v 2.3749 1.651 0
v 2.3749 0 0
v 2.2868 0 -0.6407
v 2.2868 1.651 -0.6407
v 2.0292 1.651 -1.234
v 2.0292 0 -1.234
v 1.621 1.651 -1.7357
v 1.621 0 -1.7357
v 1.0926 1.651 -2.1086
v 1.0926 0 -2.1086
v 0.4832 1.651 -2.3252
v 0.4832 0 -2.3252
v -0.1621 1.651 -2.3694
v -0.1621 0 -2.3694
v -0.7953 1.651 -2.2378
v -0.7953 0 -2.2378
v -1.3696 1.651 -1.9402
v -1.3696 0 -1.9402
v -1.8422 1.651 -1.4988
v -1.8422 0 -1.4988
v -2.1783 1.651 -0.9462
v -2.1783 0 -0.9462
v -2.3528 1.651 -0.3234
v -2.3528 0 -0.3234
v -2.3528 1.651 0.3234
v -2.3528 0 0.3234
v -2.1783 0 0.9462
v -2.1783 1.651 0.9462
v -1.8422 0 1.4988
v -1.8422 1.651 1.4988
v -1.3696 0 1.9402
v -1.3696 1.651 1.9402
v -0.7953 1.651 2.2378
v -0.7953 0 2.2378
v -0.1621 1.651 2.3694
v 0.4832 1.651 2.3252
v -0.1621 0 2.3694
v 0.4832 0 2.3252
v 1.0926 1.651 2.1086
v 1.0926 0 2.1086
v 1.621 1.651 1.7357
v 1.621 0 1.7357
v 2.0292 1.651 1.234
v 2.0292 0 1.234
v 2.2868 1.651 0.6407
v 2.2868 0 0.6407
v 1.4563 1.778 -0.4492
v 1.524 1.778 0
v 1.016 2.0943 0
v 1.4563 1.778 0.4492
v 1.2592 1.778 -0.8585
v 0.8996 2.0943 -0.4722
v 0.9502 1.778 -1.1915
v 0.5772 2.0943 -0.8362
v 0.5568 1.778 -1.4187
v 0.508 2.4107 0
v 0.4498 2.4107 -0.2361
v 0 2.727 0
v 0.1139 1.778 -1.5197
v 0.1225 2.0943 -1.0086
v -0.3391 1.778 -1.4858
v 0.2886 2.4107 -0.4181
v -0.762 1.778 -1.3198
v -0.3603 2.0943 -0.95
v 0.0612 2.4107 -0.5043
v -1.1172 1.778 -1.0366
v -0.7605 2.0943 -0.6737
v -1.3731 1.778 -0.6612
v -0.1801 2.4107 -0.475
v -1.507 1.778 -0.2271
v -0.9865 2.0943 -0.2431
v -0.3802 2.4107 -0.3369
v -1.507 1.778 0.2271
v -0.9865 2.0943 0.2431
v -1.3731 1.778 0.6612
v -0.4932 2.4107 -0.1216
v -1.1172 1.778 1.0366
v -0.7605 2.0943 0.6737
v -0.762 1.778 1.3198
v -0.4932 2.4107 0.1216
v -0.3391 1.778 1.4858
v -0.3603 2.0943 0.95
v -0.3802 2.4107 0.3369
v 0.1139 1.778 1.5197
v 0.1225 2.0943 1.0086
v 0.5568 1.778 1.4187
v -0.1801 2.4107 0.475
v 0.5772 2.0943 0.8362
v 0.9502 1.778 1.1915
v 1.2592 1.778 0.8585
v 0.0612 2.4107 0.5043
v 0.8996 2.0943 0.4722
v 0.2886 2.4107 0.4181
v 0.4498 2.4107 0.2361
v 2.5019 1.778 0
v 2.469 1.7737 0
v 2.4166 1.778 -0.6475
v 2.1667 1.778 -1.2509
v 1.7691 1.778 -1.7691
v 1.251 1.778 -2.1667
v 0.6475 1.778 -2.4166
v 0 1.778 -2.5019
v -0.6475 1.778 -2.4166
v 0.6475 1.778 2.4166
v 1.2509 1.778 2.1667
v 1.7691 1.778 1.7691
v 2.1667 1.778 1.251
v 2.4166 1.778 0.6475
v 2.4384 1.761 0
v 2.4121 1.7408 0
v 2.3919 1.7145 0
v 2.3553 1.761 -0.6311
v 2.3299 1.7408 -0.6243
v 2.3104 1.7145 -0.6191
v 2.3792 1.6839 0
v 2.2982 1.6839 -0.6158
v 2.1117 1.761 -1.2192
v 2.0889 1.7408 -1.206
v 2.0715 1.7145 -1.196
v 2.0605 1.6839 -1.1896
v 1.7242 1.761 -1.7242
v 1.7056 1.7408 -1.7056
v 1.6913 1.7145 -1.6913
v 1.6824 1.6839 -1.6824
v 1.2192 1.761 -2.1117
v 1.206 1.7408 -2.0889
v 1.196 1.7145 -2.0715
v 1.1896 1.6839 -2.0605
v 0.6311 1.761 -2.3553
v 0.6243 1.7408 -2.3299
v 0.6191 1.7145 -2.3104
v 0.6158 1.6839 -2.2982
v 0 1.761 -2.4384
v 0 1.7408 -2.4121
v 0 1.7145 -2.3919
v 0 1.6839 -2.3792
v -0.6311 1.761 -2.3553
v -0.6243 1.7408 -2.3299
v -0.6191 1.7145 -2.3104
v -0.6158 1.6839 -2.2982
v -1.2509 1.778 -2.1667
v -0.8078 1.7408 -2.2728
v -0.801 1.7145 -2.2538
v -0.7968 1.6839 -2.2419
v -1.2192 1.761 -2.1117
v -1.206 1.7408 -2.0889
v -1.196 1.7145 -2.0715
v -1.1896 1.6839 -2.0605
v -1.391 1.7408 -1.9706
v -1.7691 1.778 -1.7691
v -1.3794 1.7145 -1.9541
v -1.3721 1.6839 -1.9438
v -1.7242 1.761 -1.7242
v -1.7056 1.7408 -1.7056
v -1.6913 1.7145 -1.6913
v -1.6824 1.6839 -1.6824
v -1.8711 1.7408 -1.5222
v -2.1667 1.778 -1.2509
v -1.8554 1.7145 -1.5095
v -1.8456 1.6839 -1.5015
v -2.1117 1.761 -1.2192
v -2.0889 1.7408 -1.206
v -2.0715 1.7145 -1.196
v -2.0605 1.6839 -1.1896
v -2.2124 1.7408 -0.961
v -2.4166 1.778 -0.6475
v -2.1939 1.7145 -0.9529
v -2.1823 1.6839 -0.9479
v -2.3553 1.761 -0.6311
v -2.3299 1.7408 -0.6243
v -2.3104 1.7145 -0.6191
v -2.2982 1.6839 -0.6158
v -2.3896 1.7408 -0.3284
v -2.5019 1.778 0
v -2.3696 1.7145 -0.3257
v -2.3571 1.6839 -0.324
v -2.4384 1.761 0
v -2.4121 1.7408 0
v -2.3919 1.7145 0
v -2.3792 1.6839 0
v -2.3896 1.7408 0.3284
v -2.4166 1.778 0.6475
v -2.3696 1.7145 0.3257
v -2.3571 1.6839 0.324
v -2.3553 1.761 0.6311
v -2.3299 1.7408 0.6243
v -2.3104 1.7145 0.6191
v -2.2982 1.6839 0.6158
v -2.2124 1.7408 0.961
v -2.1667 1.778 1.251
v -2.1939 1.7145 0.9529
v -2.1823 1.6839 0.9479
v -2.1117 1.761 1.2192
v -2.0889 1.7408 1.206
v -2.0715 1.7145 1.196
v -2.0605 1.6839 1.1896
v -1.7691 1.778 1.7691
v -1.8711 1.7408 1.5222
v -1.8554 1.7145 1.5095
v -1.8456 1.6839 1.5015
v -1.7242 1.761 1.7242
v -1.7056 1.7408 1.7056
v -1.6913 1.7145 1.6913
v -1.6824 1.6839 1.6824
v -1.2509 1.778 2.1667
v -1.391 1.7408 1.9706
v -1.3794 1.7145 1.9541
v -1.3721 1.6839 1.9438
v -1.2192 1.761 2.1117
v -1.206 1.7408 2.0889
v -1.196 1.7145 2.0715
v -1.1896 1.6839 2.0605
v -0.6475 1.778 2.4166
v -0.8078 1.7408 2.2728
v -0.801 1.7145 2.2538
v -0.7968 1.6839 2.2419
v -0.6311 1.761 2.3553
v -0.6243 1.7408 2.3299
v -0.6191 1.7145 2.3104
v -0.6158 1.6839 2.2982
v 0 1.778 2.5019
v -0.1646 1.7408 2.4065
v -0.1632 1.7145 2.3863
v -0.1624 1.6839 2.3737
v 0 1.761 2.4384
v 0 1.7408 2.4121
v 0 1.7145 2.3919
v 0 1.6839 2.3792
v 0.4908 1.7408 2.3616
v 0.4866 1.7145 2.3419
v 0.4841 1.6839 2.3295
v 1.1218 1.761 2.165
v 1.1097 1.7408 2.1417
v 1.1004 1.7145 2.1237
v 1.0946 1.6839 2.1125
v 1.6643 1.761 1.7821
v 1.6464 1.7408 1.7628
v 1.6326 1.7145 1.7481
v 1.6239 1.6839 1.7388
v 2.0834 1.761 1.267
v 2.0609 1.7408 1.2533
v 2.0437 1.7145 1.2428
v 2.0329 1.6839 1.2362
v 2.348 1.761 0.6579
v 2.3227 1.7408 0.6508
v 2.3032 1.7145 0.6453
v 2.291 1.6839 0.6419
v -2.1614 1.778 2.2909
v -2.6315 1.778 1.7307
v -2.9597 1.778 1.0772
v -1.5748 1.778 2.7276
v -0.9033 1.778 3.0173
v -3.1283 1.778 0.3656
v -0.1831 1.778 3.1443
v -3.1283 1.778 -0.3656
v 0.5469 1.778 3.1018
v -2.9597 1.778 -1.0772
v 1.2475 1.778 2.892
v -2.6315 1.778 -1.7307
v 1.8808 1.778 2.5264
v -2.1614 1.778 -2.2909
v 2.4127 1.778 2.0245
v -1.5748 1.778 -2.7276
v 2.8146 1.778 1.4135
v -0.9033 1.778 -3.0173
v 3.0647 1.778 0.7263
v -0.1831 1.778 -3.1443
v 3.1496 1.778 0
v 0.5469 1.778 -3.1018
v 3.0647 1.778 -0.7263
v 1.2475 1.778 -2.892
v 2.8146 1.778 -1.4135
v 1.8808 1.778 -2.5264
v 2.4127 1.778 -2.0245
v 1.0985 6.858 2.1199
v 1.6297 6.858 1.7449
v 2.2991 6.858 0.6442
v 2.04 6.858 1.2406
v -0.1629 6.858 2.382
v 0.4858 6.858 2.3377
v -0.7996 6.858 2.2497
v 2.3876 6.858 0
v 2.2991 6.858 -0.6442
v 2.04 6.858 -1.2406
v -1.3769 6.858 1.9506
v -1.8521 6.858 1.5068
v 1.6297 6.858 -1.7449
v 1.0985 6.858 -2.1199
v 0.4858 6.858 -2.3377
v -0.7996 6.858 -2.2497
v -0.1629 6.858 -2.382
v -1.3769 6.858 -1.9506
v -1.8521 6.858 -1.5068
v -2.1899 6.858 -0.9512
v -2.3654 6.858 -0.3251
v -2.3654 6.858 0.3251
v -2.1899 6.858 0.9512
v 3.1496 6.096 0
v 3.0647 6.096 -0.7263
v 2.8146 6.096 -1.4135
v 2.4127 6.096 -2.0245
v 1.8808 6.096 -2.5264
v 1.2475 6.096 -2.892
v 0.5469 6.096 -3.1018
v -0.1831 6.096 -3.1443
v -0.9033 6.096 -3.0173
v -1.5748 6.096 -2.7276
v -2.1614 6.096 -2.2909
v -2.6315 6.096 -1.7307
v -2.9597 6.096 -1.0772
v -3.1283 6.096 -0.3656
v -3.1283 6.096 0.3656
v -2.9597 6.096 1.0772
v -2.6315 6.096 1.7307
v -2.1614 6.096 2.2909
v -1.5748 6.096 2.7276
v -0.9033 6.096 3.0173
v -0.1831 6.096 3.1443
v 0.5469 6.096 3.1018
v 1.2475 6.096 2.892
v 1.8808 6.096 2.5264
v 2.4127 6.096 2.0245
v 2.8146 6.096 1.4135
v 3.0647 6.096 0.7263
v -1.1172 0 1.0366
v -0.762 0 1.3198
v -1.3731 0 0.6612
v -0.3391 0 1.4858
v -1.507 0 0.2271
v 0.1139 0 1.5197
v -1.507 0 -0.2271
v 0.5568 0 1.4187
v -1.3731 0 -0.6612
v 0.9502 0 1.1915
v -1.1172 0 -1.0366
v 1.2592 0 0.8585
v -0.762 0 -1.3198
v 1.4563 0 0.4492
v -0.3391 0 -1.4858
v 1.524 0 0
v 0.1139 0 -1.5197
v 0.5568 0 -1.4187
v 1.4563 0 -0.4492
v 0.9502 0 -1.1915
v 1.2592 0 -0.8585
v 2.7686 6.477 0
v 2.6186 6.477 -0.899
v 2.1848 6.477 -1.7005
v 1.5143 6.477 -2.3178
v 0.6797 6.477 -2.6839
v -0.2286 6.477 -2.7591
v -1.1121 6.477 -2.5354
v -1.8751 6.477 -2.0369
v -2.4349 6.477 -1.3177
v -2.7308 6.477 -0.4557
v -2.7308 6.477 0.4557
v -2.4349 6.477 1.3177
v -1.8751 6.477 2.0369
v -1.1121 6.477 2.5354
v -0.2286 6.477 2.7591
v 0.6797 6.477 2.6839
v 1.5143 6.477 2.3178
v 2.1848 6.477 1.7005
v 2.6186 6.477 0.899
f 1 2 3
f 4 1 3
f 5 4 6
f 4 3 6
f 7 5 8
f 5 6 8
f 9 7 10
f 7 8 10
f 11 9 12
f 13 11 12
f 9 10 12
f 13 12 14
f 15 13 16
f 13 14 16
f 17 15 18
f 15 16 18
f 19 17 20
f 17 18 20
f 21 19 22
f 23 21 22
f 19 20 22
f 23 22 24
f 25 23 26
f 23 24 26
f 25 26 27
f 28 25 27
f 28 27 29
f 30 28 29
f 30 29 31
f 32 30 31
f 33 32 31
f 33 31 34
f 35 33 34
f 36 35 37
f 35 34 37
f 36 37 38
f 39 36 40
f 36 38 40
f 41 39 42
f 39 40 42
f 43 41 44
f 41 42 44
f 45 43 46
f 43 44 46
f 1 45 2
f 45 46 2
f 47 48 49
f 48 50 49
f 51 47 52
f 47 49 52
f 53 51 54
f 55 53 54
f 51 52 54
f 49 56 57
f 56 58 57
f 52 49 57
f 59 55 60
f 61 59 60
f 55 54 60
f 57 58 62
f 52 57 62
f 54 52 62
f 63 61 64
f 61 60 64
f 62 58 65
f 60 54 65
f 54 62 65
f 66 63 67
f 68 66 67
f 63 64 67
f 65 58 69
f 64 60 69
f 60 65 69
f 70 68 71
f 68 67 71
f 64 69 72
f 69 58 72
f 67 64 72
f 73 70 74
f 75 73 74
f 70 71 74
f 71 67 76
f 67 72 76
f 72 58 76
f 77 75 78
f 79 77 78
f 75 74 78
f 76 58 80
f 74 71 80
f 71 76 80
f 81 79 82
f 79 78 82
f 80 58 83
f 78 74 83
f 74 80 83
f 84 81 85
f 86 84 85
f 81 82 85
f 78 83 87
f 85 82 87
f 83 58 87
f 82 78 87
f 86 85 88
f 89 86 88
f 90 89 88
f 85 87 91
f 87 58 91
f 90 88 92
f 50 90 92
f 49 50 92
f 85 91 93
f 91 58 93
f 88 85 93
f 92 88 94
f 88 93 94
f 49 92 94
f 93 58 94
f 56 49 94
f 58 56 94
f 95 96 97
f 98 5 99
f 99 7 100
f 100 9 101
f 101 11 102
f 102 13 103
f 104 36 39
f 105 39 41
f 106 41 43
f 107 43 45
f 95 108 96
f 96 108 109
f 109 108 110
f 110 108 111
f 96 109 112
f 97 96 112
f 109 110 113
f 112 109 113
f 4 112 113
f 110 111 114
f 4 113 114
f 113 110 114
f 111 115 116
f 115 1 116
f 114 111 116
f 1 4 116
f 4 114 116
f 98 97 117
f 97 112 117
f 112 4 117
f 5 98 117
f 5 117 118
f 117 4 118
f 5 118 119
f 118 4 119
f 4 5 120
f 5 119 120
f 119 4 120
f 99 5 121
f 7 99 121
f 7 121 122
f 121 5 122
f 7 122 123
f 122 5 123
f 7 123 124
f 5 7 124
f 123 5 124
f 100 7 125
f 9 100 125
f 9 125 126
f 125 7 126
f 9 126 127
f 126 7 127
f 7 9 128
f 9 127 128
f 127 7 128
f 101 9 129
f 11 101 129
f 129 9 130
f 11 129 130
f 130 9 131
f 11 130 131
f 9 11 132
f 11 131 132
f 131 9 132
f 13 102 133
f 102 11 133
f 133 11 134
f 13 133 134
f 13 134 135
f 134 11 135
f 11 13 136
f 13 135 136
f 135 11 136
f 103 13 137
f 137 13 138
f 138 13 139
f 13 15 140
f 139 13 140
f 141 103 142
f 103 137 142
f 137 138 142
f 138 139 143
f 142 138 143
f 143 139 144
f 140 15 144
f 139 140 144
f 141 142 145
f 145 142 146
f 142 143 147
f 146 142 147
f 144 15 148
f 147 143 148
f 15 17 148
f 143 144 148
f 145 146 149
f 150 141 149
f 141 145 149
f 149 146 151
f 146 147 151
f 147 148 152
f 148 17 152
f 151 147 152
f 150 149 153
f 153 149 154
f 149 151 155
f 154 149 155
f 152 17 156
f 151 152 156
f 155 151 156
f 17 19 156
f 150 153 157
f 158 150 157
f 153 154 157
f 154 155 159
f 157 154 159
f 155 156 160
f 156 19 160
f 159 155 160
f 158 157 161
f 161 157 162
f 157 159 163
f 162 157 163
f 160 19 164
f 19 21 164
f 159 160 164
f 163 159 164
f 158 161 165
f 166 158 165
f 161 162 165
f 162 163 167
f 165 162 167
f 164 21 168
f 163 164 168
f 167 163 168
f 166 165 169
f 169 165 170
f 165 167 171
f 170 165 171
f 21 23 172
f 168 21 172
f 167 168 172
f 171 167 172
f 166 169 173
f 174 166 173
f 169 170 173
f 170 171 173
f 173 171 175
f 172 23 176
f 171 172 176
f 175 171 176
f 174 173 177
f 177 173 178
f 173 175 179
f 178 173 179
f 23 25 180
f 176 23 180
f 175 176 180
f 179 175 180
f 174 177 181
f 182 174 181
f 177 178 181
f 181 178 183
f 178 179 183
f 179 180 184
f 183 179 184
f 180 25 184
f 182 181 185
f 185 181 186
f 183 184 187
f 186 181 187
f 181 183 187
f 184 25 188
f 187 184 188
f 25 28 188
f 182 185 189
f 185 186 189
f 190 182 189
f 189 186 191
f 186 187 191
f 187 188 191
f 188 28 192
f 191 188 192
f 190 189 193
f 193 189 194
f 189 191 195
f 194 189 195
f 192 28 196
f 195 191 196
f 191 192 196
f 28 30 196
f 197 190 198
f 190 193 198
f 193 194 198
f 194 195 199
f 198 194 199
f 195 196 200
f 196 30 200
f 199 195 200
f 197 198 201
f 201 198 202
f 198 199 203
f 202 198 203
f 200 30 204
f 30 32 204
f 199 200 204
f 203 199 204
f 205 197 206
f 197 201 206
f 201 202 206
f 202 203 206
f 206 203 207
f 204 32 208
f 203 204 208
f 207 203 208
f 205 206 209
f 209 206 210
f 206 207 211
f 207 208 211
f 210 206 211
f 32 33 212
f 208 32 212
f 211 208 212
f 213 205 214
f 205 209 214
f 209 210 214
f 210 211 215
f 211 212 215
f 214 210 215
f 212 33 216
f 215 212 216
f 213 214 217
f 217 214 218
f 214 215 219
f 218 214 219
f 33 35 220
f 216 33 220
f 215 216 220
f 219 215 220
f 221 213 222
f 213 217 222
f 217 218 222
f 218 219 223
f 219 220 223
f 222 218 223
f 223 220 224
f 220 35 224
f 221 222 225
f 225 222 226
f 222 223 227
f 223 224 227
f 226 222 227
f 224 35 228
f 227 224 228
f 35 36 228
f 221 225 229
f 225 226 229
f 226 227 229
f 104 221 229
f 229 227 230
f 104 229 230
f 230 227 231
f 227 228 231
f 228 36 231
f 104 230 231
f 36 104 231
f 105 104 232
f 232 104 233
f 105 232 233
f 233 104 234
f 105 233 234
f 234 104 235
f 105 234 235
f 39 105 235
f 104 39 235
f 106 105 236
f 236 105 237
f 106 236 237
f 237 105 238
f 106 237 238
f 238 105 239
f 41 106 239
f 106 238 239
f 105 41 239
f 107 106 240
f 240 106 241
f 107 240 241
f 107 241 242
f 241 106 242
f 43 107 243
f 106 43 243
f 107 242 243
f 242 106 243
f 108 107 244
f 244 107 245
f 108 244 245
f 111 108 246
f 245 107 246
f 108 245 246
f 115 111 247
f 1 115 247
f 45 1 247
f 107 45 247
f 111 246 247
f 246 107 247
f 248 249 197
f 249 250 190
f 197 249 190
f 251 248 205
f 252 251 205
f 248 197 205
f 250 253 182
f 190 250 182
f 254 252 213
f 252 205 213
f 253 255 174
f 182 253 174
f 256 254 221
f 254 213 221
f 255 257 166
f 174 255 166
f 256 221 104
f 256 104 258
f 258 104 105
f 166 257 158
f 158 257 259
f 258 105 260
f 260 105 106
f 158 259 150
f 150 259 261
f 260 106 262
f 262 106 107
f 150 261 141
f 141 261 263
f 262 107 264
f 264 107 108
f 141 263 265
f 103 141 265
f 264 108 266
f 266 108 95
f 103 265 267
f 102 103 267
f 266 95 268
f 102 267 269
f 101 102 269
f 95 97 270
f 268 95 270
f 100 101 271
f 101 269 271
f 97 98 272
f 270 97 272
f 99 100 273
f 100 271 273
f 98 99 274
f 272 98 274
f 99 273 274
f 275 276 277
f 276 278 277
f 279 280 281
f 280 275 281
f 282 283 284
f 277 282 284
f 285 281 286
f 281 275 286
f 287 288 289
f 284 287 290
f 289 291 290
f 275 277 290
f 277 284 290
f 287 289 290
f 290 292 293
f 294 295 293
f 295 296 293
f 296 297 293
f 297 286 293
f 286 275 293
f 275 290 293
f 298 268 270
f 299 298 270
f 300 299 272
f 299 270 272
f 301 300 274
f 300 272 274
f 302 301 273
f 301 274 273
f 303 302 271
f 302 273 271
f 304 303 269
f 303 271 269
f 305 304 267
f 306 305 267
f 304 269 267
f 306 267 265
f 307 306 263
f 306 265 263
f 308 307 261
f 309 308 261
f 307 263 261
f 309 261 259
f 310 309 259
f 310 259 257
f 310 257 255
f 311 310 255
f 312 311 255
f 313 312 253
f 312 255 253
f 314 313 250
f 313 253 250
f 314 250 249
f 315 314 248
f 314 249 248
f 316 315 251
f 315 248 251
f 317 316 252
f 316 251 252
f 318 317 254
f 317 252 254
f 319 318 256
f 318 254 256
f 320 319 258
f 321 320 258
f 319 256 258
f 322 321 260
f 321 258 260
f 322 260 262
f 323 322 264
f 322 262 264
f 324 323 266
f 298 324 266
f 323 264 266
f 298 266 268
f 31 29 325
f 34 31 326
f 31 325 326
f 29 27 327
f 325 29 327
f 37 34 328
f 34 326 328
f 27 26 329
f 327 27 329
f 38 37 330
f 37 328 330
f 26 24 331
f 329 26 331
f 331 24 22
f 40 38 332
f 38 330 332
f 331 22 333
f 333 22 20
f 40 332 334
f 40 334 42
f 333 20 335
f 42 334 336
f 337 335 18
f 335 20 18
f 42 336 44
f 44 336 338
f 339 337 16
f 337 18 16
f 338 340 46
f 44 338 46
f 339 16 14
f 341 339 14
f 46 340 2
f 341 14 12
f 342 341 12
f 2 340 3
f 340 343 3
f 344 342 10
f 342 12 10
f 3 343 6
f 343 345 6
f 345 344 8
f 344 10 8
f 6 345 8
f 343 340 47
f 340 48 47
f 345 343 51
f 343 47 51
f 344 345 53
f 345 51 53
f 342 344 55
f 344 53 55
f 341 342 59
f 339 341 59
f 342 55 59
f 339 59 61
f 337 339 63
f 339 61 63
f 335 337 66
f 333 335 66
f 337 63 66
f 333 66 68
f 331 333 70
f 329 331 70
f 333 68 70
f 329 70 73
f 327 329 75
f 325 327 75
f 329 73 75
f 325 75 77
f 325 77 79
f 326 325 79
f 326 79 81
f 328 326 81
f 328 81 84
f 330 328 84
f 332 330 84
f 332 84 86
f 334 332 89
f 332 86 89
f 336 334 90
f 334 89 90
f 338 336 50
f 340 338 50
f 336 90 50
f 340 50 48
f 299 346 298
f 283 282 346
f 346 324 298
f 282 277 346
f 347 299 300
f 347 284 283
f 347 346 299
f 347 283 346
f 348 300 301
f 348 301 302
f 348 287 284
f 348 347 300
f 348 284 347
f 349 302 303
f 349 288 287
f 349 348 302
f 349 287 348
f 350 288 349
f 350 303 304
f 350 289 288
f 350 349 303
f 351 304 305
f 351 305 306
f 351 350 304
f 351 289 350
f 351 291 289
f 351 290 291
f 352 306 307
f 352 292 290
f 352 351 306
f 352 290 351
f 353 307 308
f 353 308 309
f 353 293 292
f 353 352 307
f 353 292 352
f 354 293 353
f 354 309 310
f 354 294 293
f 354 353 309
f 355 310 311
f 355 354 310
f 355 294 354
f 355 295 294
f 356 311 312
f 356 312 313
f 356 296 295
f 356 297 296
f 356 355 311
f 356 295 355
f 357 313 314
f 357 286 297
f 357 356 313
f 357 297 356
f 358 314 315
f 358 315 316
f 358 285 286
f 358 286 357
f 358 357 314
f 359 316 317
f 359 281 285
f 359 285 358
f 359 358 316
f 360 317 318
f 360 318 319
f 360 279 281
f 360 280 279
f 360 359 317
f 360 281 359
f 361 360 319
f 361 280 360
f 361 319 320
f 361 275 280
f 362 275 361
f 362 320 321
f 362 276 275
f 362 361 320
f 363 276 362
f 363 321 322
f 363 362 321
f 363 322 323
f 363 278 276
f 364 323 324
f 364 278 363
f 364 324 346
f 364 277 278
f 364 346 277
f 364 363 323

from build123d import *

# Parameters (mm, degrees)
FILLET1_R     = 0.127
CHAMFER1_SIZE = 0.762


with BuildPart() as part:
    # Sketch1 → Revolve1 (revolve)
    with BuildSketch(Plane.XY):
        Polygon((0, 6.858), (3.1496, 6.858), (3.1496, 1.778), (2.3749, 1.778), (2.3749, 0), (1.524, 0), (1.524, 1.778), (0, 2.726975536), align=None)
    revolve(axis=Axis((0, 0, 0), (0, 1, 0)))

    # Fillet1
    fillet1_edges = [part.edges().sort_by_distance(p)[0] for p in [
        (-2.3749, 1.778, 0),
    ]]
    fillet(fillet1_edges, radius=FILLET1_R)

    # Chamfer1
    chamfer1_edges = [part.edges().sort_by_distance(p)[0] for p in [
        (-3.1496, 6.858, 0),
    ]]
    chamfer(chamfer1_edges, length=CHAMFER1_SIZE)


solid = part.part
